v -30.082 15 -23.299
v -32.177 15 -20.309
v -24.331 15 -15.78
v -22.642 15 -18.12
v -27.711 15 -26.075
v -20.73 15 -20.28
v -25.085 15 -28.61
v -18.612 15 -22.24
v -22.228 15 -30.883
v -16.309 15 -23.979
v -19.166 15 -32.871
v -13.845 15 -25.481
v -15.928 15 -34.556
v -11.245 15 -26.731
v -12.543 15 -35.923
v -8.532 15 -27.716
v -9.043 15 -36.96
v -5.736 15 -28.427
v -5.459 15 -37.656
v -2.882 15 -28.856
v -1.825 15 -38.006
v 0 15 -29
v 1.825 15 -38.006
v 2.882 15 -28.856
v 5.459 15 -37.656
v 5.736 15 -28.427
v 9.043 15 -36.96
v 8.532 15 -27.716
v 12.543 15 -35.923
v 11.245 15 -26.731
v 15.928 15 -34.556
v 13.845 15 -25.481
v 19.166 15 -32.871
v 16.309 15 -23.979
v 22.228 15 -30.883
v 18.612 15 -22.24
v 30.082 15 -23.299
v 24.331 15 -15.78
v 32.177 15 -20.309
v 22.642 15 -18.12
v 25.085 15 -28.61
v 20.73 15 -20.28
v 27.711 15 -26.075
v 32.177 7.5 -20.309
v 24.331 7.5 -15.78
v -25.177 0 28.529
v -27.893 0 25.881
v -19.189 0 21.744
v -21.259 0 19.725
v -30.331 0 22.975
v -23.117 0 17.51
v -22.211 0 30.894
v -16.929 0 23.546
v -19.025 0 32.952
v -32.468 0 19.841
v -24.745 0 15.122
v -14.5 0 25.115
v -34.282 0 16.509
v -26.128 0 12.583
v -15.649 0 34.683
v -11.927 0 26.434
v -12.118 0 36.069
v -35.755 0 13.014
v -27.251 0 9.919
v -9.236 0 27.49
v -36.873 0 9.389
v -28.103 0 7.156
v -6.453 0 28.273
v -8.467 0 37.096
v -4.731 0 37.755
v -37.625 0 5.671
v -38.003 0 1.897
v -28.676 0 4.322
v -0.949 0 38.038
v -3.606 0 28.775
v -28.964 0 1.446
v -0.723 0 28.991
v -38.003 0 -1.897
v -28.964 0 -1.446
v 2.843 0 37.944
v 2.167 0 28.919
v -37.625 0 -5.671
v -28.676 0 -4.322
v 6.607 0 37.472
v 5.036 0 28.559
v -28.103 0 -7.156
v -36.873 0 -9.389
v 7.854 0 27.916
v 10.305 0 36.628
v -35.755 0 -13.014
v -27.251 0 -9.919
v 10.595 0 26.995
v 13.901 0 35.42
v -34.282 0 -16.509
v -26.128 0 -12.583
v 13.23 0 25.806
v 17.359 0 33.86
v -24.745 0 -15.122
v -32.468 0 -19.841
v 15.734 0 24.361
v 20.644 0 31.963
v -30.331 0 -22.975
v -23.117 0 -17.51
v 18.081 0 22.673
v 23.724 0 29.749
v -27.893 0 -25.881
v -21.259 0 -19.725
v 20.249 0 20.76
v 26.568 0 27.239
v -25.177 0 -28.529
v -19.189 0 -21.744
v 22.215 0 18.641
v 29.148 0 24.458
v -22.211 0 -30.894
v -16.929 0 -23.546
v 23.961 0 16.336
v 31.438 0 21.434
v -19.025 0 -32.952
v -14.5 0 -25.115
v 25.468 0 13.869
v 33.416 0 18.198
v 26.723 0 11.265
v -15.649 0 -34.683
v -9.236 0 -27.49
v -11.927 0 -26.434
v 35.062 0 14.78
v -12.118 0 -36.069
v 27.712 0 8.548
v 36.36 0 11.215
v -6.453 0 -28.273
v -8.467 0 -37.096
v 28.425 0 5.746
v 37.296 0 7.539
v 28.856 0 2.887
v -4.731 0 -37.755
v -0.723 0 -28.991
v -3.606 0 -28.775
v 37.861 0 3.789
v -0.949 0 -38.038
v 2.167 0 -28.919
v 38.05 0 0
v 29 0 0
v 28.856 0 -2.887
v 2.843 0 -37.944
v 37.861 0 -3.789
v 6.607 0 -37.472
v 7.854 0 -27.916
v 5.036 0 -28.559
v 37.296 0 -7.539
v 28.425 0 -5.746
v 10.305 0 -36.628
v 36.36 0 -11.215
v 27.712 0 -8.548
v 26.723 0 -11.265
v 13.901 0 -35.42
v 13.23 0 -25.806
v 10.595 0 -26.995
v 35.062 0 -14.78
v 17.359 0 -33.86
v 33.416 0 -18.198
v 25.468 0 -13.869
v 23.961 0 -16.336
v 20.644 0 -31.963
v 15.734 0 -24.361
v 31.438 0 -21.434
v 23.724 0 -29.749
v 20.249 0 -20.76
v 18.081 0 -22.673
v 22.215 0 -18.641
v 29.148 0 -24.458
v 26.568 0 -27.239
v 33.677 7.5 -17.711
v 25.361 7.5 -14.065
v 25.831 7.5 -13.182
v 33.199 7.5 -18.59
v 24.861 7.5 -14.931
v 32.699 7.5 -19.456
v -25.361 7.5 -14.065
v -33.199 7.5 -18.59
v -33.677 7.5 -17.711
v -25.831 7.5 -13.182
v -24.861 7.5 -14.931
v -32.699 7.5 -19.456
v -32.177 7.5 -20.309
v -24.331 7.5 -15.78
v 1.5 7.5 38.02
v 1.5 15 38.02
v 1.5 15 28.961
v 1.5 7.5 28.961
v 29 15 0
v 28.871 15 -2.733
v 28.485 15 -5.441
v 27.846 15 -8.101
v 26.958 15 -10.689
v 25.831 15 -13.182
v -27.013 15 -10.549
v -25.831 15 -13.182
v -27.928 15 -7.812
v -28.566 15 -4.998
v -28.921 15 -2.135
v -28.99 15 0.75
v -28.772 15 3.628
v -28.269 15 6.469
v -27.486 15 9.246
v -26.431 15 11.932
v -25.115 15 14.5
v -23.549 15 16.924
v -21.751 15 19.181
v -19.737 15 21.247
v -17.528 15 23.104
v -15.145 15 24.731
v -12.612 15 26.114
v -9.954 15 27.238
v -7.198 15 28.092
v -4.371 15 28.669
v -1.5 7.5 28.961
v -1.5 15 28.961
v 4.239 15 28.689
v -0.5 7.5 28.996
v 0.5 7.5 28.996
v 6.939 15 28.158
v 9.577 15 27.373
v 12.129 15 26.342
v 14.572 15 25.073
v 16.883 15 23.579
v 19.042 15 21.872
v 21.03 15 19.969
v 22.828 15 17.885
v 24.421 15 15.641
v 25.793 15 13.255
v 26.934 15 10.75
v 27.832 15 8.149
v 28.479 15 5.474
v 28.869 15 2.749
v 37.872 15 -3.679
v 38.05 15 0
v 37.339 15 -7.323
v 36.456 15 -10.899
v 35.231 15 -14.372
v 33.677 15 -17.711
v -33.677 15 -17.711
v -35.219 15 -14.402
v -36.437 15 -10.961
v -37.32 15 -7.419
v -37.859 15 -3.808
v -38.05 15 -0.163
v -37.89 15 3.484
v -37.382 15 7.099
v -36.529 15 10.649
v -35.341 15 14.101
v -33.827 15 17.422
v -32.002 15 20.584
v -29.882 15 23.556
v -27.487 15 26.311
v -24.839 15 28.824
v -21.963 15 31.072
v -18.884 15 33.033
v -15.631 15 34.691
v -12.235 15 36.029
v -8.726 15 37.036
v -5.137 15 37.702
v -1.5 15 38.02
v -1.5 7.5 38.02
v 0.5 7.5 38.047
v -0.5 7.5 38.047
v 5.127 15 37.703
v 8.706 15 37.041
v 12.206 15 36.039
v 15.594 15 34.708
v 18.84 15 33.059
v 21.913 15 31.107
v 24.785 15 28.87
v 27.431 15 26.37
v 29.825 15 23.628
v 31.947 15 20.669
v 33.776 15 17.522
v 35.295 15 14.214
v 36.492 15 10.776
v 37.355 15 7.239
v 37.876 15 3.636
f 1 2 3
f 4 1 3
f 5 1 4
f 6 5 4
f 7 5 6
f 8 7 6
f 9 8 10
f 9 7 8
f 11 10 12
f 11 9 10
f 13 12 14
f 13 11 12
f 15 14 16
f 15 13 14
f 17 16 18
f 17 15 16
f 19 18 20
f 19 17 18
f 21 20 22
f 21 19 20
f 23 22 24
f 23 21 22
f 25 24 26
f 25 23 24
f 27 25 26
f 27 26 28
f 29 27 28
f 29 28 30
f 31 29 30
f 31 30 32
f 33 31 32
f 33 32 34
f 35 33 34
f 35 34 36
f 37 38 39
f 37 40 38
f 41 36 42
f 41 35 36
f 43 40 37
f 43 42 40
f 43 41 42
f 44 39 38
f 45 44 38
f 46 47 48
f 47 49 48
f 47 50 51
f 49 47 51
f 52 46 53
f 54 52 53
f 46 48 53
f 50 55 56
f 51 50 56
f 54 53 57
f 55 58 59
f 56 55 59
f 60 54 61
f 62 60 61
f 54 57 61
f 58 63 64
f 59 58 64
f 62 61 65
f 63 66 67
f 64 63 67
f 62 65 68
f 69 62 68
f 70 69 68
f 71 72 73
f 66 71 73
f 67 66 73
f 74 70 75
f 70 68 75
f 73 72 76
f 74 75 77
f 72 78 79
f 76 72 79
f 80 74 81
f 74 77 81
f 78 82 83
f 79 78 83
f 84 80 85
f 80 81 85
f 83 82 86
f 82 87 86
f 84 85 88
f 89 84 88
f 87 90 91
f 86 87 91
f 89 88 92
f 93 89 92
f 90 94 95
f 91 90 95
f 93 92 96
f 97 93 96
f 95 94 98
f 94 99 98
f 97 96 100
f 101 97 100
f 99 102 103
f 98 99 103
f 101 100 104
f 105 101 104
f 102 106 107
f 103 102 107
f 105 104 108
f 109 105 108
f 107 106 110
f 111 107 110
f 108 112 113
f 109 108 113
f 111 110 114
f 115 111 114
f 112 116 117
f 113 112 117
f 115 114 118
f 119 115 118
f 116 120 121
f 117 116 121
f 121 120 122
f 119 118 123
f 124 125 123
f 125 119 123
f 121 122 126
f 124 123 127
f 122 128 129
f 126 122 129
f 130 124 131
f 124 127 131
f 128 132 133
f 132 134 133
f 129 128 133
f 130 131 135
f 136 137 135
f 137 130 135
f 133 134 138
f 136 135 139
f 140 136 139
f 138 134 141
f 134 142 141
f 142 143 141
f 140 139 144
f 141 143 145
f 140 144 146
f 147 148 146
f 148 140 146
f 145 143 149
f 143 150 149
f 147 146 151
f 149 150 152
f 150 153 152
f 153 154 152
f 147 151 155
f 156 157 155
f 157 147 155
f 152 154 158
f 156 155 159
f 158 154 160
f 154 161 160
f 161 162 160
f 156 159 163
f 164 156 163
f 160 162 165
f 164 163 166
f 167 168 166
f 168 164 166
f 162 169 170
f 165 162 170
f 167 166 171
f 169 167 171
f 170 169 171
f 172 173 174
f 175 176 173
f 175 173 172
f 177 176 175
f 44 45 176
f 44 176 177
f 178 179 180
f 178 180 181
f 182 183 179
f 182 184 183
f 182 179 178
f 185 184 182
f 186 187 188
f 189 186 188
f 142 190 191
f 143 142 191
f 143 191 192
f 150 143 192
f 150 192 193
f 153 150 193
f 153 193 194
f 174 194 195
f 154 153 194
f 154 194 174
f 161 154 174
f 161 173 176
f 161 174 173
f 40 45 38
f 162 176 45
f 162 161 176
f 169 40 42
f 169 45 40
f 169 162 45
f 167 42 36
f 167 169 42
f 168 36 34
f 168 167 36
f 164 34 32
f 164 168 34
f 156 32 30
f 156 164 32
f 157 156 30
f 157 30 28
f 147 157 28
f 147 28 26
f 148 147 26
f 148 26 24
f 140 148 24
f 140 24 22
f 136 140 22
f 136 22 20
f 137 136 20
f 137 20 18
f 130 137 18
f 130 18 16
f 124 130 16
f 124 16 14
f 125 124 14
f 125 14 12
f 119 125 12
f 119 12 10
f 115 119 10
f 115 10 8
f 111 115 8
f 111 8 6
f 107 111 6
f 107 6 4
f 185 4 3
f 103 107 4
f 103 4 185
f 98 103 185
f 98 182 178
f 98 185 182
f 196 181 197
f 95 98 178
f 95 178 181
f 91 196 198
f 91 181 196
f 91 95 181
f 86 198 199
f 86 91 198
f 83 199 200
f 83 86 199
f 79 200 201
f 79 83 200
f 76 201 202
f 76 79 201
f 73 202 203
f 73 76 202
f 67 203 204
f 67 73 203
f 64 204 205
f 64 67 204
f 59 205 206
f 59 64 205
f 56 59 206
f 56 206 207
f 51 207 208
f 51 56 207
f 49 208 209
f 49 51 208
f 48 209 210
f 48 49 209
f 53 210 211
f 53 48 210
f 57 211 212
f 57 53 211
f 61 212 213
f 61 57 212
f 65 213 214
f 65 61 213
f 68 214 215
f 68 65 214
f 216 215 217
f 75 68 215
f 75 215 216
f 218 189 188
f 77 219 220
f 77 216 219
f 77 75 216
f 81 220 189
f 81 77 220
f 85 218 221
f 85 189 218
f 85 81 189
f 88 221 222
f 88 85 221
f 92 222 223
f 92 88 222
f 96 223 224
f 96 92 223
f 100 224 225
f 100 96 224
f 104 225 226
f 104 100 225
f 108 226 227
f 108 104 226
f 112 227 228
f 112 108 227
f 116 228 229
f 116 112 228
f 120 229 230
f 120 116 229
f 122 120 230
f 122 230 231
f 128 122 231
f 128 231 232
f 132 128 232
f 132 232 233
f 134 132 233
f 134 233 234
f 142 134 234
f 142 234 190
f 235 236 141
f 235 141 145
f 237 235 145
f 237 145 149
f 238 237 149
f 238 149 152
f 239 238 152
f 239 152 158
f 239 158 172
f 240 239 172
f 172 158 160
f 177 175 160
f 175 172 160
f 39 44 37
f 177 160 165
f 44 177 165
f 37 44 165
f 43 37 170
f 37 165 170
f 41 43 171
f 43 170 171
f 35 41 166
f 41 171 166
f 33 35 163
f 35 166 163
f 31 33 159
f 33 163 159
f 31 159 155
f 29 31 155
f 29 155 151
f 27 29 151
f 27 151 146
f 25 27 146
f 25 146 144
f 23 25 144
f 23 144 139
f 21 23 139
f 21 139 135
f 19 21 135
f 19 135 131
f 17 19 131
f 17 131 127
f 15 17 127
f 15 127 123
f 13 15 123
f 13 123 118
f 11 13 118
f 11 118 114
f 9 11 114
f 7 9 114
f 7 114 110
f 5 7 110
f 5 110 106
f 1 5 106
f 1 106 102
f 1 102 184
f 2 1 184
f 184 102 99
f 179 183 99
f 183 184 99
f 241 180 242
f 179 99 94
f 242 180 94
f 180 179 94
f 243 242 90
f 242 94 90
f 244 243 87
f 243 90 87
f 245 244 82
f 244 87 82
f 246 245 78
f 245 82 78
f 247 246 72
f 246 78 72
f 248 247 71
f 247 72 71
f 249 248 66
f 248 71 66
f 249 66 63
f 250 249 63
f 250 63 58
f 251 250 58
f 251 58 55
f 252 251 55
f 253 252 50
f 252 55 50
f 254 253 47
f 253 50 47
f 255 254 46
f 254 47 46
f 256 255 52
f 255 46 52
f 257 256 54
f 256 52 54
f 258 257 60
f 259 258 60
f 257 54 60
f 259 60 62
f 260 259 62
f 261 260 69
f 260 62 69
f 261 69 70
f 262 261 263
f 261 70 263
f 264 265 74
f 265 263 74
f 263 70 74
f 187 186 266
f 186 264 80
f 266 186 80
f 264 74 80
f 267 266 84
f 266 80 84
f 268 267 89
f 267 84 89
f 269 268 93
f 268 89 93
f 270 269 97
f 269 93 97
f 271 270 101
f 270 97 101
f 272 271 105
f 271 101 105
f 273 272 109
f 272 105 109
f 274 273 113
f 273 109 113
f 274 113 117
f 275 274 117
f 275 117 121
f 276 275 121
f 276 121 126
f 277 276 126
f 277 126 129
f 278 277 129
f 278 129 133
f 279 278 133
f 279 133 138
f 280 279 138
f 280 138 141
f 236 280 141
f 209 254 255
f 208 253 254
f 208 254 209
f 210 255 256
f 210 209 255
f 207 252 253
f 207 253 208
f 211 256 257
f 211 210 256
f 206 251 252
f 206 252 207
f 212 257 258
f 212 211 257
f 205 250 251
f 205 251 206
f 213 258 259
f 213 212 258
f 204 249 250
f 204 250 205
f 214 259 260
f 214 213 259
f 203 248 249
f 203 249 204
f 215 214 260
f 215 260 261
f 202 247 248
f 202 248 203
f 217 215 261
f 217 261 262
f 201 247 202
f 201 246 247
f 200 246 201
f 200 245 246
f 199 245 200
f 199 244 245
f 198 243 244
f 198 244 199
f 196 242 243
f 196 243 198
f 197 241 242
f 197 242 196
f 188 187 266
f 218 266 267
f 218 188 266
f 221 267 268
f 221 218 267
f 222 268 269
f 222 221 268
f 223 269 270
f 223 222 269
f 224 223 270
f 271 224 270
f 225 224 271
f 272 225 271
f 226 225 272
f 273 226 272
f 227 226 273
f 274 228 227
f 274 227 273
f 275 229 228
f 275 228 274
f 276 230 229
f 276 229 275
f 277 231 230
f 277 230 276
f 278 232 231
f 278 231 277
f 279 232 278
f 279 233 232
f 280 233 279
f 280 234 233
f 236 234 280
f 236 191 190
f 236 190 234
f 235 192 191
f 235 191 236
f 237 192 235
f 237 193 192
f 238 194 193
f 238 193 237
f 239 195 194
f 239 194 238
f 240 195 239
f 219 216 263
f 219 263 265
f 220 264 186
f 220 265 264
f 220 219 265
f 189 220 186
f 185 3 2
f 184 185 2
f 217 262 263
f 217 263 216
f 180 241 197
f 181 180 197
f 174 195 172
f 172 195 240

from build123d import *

# Parameters (mm, degrees)
SKETCH1_R               = 38.05
SKETCH1_R_2             = 29
BOSS_EXTRUDE1_DEPTH     = 15
SKETCH3_R               = 21.5
SKETCH3_R_2             = 18.5
SKETCH3_R_3             = 54.301992004
SKETCH3_R_4             = 51.301992004
SKETCH3_W               = 3
SKETCH3_H               = 32.801992004
CUT_EXTRUDE_THIN1_DEPTH = 7.5


with BuildPart() as part:
    # Sketch1 → Boss-Extrude1 (new body)
    with BuildSketch(Plane(origin=(0, 0, 0), x_dir=(1, 0, 0), z_dir=(0, 1, 0))):
        Circle(SKETCH1_R)
        Circle(SKETCH1_R_2, mode=Mode.SUBTRACT)
    extrude(amount=BOSS_EXTRUDE1_DEPTH)

    # Sketch3 → Cut-Extrude-Thin1 (cut)
    with BuildSketch(Plane(origin=(0, 15, 0), x_dir=(1, 0, 0), z_dir=(0, 1, 0))):
        Circle(SKETCH3_R)
        Circle(SKETCH3_R_2, mode=Mode.SUBTRACT)
        Circle(SKETCH3_R_3)
        Circle(SKETCH3_R_4, mode=Mode.SUBTRACT)
        with Locations((0, -36.400996002)):
            Rectangle(SKETCH3_W, SKETCH3_H)
        Polygon((-16.570508076, 11.299038106), (-44.977866446, 27.700034108), (-46.477866446, 25.101957897), (-18.070508076, 8.700961894), align=None)
        Polygon((18.070508076, 8.700961894), (46.477866446, 25.101957897), (44.977866446, 27.700034108), (16.570508076, 11.299038106), align=None)
    extrude(amount=-CUT_EXTRUDE_THIN1_DEPTH, mode=Mode.SUBTRACT)


solid = part.part
